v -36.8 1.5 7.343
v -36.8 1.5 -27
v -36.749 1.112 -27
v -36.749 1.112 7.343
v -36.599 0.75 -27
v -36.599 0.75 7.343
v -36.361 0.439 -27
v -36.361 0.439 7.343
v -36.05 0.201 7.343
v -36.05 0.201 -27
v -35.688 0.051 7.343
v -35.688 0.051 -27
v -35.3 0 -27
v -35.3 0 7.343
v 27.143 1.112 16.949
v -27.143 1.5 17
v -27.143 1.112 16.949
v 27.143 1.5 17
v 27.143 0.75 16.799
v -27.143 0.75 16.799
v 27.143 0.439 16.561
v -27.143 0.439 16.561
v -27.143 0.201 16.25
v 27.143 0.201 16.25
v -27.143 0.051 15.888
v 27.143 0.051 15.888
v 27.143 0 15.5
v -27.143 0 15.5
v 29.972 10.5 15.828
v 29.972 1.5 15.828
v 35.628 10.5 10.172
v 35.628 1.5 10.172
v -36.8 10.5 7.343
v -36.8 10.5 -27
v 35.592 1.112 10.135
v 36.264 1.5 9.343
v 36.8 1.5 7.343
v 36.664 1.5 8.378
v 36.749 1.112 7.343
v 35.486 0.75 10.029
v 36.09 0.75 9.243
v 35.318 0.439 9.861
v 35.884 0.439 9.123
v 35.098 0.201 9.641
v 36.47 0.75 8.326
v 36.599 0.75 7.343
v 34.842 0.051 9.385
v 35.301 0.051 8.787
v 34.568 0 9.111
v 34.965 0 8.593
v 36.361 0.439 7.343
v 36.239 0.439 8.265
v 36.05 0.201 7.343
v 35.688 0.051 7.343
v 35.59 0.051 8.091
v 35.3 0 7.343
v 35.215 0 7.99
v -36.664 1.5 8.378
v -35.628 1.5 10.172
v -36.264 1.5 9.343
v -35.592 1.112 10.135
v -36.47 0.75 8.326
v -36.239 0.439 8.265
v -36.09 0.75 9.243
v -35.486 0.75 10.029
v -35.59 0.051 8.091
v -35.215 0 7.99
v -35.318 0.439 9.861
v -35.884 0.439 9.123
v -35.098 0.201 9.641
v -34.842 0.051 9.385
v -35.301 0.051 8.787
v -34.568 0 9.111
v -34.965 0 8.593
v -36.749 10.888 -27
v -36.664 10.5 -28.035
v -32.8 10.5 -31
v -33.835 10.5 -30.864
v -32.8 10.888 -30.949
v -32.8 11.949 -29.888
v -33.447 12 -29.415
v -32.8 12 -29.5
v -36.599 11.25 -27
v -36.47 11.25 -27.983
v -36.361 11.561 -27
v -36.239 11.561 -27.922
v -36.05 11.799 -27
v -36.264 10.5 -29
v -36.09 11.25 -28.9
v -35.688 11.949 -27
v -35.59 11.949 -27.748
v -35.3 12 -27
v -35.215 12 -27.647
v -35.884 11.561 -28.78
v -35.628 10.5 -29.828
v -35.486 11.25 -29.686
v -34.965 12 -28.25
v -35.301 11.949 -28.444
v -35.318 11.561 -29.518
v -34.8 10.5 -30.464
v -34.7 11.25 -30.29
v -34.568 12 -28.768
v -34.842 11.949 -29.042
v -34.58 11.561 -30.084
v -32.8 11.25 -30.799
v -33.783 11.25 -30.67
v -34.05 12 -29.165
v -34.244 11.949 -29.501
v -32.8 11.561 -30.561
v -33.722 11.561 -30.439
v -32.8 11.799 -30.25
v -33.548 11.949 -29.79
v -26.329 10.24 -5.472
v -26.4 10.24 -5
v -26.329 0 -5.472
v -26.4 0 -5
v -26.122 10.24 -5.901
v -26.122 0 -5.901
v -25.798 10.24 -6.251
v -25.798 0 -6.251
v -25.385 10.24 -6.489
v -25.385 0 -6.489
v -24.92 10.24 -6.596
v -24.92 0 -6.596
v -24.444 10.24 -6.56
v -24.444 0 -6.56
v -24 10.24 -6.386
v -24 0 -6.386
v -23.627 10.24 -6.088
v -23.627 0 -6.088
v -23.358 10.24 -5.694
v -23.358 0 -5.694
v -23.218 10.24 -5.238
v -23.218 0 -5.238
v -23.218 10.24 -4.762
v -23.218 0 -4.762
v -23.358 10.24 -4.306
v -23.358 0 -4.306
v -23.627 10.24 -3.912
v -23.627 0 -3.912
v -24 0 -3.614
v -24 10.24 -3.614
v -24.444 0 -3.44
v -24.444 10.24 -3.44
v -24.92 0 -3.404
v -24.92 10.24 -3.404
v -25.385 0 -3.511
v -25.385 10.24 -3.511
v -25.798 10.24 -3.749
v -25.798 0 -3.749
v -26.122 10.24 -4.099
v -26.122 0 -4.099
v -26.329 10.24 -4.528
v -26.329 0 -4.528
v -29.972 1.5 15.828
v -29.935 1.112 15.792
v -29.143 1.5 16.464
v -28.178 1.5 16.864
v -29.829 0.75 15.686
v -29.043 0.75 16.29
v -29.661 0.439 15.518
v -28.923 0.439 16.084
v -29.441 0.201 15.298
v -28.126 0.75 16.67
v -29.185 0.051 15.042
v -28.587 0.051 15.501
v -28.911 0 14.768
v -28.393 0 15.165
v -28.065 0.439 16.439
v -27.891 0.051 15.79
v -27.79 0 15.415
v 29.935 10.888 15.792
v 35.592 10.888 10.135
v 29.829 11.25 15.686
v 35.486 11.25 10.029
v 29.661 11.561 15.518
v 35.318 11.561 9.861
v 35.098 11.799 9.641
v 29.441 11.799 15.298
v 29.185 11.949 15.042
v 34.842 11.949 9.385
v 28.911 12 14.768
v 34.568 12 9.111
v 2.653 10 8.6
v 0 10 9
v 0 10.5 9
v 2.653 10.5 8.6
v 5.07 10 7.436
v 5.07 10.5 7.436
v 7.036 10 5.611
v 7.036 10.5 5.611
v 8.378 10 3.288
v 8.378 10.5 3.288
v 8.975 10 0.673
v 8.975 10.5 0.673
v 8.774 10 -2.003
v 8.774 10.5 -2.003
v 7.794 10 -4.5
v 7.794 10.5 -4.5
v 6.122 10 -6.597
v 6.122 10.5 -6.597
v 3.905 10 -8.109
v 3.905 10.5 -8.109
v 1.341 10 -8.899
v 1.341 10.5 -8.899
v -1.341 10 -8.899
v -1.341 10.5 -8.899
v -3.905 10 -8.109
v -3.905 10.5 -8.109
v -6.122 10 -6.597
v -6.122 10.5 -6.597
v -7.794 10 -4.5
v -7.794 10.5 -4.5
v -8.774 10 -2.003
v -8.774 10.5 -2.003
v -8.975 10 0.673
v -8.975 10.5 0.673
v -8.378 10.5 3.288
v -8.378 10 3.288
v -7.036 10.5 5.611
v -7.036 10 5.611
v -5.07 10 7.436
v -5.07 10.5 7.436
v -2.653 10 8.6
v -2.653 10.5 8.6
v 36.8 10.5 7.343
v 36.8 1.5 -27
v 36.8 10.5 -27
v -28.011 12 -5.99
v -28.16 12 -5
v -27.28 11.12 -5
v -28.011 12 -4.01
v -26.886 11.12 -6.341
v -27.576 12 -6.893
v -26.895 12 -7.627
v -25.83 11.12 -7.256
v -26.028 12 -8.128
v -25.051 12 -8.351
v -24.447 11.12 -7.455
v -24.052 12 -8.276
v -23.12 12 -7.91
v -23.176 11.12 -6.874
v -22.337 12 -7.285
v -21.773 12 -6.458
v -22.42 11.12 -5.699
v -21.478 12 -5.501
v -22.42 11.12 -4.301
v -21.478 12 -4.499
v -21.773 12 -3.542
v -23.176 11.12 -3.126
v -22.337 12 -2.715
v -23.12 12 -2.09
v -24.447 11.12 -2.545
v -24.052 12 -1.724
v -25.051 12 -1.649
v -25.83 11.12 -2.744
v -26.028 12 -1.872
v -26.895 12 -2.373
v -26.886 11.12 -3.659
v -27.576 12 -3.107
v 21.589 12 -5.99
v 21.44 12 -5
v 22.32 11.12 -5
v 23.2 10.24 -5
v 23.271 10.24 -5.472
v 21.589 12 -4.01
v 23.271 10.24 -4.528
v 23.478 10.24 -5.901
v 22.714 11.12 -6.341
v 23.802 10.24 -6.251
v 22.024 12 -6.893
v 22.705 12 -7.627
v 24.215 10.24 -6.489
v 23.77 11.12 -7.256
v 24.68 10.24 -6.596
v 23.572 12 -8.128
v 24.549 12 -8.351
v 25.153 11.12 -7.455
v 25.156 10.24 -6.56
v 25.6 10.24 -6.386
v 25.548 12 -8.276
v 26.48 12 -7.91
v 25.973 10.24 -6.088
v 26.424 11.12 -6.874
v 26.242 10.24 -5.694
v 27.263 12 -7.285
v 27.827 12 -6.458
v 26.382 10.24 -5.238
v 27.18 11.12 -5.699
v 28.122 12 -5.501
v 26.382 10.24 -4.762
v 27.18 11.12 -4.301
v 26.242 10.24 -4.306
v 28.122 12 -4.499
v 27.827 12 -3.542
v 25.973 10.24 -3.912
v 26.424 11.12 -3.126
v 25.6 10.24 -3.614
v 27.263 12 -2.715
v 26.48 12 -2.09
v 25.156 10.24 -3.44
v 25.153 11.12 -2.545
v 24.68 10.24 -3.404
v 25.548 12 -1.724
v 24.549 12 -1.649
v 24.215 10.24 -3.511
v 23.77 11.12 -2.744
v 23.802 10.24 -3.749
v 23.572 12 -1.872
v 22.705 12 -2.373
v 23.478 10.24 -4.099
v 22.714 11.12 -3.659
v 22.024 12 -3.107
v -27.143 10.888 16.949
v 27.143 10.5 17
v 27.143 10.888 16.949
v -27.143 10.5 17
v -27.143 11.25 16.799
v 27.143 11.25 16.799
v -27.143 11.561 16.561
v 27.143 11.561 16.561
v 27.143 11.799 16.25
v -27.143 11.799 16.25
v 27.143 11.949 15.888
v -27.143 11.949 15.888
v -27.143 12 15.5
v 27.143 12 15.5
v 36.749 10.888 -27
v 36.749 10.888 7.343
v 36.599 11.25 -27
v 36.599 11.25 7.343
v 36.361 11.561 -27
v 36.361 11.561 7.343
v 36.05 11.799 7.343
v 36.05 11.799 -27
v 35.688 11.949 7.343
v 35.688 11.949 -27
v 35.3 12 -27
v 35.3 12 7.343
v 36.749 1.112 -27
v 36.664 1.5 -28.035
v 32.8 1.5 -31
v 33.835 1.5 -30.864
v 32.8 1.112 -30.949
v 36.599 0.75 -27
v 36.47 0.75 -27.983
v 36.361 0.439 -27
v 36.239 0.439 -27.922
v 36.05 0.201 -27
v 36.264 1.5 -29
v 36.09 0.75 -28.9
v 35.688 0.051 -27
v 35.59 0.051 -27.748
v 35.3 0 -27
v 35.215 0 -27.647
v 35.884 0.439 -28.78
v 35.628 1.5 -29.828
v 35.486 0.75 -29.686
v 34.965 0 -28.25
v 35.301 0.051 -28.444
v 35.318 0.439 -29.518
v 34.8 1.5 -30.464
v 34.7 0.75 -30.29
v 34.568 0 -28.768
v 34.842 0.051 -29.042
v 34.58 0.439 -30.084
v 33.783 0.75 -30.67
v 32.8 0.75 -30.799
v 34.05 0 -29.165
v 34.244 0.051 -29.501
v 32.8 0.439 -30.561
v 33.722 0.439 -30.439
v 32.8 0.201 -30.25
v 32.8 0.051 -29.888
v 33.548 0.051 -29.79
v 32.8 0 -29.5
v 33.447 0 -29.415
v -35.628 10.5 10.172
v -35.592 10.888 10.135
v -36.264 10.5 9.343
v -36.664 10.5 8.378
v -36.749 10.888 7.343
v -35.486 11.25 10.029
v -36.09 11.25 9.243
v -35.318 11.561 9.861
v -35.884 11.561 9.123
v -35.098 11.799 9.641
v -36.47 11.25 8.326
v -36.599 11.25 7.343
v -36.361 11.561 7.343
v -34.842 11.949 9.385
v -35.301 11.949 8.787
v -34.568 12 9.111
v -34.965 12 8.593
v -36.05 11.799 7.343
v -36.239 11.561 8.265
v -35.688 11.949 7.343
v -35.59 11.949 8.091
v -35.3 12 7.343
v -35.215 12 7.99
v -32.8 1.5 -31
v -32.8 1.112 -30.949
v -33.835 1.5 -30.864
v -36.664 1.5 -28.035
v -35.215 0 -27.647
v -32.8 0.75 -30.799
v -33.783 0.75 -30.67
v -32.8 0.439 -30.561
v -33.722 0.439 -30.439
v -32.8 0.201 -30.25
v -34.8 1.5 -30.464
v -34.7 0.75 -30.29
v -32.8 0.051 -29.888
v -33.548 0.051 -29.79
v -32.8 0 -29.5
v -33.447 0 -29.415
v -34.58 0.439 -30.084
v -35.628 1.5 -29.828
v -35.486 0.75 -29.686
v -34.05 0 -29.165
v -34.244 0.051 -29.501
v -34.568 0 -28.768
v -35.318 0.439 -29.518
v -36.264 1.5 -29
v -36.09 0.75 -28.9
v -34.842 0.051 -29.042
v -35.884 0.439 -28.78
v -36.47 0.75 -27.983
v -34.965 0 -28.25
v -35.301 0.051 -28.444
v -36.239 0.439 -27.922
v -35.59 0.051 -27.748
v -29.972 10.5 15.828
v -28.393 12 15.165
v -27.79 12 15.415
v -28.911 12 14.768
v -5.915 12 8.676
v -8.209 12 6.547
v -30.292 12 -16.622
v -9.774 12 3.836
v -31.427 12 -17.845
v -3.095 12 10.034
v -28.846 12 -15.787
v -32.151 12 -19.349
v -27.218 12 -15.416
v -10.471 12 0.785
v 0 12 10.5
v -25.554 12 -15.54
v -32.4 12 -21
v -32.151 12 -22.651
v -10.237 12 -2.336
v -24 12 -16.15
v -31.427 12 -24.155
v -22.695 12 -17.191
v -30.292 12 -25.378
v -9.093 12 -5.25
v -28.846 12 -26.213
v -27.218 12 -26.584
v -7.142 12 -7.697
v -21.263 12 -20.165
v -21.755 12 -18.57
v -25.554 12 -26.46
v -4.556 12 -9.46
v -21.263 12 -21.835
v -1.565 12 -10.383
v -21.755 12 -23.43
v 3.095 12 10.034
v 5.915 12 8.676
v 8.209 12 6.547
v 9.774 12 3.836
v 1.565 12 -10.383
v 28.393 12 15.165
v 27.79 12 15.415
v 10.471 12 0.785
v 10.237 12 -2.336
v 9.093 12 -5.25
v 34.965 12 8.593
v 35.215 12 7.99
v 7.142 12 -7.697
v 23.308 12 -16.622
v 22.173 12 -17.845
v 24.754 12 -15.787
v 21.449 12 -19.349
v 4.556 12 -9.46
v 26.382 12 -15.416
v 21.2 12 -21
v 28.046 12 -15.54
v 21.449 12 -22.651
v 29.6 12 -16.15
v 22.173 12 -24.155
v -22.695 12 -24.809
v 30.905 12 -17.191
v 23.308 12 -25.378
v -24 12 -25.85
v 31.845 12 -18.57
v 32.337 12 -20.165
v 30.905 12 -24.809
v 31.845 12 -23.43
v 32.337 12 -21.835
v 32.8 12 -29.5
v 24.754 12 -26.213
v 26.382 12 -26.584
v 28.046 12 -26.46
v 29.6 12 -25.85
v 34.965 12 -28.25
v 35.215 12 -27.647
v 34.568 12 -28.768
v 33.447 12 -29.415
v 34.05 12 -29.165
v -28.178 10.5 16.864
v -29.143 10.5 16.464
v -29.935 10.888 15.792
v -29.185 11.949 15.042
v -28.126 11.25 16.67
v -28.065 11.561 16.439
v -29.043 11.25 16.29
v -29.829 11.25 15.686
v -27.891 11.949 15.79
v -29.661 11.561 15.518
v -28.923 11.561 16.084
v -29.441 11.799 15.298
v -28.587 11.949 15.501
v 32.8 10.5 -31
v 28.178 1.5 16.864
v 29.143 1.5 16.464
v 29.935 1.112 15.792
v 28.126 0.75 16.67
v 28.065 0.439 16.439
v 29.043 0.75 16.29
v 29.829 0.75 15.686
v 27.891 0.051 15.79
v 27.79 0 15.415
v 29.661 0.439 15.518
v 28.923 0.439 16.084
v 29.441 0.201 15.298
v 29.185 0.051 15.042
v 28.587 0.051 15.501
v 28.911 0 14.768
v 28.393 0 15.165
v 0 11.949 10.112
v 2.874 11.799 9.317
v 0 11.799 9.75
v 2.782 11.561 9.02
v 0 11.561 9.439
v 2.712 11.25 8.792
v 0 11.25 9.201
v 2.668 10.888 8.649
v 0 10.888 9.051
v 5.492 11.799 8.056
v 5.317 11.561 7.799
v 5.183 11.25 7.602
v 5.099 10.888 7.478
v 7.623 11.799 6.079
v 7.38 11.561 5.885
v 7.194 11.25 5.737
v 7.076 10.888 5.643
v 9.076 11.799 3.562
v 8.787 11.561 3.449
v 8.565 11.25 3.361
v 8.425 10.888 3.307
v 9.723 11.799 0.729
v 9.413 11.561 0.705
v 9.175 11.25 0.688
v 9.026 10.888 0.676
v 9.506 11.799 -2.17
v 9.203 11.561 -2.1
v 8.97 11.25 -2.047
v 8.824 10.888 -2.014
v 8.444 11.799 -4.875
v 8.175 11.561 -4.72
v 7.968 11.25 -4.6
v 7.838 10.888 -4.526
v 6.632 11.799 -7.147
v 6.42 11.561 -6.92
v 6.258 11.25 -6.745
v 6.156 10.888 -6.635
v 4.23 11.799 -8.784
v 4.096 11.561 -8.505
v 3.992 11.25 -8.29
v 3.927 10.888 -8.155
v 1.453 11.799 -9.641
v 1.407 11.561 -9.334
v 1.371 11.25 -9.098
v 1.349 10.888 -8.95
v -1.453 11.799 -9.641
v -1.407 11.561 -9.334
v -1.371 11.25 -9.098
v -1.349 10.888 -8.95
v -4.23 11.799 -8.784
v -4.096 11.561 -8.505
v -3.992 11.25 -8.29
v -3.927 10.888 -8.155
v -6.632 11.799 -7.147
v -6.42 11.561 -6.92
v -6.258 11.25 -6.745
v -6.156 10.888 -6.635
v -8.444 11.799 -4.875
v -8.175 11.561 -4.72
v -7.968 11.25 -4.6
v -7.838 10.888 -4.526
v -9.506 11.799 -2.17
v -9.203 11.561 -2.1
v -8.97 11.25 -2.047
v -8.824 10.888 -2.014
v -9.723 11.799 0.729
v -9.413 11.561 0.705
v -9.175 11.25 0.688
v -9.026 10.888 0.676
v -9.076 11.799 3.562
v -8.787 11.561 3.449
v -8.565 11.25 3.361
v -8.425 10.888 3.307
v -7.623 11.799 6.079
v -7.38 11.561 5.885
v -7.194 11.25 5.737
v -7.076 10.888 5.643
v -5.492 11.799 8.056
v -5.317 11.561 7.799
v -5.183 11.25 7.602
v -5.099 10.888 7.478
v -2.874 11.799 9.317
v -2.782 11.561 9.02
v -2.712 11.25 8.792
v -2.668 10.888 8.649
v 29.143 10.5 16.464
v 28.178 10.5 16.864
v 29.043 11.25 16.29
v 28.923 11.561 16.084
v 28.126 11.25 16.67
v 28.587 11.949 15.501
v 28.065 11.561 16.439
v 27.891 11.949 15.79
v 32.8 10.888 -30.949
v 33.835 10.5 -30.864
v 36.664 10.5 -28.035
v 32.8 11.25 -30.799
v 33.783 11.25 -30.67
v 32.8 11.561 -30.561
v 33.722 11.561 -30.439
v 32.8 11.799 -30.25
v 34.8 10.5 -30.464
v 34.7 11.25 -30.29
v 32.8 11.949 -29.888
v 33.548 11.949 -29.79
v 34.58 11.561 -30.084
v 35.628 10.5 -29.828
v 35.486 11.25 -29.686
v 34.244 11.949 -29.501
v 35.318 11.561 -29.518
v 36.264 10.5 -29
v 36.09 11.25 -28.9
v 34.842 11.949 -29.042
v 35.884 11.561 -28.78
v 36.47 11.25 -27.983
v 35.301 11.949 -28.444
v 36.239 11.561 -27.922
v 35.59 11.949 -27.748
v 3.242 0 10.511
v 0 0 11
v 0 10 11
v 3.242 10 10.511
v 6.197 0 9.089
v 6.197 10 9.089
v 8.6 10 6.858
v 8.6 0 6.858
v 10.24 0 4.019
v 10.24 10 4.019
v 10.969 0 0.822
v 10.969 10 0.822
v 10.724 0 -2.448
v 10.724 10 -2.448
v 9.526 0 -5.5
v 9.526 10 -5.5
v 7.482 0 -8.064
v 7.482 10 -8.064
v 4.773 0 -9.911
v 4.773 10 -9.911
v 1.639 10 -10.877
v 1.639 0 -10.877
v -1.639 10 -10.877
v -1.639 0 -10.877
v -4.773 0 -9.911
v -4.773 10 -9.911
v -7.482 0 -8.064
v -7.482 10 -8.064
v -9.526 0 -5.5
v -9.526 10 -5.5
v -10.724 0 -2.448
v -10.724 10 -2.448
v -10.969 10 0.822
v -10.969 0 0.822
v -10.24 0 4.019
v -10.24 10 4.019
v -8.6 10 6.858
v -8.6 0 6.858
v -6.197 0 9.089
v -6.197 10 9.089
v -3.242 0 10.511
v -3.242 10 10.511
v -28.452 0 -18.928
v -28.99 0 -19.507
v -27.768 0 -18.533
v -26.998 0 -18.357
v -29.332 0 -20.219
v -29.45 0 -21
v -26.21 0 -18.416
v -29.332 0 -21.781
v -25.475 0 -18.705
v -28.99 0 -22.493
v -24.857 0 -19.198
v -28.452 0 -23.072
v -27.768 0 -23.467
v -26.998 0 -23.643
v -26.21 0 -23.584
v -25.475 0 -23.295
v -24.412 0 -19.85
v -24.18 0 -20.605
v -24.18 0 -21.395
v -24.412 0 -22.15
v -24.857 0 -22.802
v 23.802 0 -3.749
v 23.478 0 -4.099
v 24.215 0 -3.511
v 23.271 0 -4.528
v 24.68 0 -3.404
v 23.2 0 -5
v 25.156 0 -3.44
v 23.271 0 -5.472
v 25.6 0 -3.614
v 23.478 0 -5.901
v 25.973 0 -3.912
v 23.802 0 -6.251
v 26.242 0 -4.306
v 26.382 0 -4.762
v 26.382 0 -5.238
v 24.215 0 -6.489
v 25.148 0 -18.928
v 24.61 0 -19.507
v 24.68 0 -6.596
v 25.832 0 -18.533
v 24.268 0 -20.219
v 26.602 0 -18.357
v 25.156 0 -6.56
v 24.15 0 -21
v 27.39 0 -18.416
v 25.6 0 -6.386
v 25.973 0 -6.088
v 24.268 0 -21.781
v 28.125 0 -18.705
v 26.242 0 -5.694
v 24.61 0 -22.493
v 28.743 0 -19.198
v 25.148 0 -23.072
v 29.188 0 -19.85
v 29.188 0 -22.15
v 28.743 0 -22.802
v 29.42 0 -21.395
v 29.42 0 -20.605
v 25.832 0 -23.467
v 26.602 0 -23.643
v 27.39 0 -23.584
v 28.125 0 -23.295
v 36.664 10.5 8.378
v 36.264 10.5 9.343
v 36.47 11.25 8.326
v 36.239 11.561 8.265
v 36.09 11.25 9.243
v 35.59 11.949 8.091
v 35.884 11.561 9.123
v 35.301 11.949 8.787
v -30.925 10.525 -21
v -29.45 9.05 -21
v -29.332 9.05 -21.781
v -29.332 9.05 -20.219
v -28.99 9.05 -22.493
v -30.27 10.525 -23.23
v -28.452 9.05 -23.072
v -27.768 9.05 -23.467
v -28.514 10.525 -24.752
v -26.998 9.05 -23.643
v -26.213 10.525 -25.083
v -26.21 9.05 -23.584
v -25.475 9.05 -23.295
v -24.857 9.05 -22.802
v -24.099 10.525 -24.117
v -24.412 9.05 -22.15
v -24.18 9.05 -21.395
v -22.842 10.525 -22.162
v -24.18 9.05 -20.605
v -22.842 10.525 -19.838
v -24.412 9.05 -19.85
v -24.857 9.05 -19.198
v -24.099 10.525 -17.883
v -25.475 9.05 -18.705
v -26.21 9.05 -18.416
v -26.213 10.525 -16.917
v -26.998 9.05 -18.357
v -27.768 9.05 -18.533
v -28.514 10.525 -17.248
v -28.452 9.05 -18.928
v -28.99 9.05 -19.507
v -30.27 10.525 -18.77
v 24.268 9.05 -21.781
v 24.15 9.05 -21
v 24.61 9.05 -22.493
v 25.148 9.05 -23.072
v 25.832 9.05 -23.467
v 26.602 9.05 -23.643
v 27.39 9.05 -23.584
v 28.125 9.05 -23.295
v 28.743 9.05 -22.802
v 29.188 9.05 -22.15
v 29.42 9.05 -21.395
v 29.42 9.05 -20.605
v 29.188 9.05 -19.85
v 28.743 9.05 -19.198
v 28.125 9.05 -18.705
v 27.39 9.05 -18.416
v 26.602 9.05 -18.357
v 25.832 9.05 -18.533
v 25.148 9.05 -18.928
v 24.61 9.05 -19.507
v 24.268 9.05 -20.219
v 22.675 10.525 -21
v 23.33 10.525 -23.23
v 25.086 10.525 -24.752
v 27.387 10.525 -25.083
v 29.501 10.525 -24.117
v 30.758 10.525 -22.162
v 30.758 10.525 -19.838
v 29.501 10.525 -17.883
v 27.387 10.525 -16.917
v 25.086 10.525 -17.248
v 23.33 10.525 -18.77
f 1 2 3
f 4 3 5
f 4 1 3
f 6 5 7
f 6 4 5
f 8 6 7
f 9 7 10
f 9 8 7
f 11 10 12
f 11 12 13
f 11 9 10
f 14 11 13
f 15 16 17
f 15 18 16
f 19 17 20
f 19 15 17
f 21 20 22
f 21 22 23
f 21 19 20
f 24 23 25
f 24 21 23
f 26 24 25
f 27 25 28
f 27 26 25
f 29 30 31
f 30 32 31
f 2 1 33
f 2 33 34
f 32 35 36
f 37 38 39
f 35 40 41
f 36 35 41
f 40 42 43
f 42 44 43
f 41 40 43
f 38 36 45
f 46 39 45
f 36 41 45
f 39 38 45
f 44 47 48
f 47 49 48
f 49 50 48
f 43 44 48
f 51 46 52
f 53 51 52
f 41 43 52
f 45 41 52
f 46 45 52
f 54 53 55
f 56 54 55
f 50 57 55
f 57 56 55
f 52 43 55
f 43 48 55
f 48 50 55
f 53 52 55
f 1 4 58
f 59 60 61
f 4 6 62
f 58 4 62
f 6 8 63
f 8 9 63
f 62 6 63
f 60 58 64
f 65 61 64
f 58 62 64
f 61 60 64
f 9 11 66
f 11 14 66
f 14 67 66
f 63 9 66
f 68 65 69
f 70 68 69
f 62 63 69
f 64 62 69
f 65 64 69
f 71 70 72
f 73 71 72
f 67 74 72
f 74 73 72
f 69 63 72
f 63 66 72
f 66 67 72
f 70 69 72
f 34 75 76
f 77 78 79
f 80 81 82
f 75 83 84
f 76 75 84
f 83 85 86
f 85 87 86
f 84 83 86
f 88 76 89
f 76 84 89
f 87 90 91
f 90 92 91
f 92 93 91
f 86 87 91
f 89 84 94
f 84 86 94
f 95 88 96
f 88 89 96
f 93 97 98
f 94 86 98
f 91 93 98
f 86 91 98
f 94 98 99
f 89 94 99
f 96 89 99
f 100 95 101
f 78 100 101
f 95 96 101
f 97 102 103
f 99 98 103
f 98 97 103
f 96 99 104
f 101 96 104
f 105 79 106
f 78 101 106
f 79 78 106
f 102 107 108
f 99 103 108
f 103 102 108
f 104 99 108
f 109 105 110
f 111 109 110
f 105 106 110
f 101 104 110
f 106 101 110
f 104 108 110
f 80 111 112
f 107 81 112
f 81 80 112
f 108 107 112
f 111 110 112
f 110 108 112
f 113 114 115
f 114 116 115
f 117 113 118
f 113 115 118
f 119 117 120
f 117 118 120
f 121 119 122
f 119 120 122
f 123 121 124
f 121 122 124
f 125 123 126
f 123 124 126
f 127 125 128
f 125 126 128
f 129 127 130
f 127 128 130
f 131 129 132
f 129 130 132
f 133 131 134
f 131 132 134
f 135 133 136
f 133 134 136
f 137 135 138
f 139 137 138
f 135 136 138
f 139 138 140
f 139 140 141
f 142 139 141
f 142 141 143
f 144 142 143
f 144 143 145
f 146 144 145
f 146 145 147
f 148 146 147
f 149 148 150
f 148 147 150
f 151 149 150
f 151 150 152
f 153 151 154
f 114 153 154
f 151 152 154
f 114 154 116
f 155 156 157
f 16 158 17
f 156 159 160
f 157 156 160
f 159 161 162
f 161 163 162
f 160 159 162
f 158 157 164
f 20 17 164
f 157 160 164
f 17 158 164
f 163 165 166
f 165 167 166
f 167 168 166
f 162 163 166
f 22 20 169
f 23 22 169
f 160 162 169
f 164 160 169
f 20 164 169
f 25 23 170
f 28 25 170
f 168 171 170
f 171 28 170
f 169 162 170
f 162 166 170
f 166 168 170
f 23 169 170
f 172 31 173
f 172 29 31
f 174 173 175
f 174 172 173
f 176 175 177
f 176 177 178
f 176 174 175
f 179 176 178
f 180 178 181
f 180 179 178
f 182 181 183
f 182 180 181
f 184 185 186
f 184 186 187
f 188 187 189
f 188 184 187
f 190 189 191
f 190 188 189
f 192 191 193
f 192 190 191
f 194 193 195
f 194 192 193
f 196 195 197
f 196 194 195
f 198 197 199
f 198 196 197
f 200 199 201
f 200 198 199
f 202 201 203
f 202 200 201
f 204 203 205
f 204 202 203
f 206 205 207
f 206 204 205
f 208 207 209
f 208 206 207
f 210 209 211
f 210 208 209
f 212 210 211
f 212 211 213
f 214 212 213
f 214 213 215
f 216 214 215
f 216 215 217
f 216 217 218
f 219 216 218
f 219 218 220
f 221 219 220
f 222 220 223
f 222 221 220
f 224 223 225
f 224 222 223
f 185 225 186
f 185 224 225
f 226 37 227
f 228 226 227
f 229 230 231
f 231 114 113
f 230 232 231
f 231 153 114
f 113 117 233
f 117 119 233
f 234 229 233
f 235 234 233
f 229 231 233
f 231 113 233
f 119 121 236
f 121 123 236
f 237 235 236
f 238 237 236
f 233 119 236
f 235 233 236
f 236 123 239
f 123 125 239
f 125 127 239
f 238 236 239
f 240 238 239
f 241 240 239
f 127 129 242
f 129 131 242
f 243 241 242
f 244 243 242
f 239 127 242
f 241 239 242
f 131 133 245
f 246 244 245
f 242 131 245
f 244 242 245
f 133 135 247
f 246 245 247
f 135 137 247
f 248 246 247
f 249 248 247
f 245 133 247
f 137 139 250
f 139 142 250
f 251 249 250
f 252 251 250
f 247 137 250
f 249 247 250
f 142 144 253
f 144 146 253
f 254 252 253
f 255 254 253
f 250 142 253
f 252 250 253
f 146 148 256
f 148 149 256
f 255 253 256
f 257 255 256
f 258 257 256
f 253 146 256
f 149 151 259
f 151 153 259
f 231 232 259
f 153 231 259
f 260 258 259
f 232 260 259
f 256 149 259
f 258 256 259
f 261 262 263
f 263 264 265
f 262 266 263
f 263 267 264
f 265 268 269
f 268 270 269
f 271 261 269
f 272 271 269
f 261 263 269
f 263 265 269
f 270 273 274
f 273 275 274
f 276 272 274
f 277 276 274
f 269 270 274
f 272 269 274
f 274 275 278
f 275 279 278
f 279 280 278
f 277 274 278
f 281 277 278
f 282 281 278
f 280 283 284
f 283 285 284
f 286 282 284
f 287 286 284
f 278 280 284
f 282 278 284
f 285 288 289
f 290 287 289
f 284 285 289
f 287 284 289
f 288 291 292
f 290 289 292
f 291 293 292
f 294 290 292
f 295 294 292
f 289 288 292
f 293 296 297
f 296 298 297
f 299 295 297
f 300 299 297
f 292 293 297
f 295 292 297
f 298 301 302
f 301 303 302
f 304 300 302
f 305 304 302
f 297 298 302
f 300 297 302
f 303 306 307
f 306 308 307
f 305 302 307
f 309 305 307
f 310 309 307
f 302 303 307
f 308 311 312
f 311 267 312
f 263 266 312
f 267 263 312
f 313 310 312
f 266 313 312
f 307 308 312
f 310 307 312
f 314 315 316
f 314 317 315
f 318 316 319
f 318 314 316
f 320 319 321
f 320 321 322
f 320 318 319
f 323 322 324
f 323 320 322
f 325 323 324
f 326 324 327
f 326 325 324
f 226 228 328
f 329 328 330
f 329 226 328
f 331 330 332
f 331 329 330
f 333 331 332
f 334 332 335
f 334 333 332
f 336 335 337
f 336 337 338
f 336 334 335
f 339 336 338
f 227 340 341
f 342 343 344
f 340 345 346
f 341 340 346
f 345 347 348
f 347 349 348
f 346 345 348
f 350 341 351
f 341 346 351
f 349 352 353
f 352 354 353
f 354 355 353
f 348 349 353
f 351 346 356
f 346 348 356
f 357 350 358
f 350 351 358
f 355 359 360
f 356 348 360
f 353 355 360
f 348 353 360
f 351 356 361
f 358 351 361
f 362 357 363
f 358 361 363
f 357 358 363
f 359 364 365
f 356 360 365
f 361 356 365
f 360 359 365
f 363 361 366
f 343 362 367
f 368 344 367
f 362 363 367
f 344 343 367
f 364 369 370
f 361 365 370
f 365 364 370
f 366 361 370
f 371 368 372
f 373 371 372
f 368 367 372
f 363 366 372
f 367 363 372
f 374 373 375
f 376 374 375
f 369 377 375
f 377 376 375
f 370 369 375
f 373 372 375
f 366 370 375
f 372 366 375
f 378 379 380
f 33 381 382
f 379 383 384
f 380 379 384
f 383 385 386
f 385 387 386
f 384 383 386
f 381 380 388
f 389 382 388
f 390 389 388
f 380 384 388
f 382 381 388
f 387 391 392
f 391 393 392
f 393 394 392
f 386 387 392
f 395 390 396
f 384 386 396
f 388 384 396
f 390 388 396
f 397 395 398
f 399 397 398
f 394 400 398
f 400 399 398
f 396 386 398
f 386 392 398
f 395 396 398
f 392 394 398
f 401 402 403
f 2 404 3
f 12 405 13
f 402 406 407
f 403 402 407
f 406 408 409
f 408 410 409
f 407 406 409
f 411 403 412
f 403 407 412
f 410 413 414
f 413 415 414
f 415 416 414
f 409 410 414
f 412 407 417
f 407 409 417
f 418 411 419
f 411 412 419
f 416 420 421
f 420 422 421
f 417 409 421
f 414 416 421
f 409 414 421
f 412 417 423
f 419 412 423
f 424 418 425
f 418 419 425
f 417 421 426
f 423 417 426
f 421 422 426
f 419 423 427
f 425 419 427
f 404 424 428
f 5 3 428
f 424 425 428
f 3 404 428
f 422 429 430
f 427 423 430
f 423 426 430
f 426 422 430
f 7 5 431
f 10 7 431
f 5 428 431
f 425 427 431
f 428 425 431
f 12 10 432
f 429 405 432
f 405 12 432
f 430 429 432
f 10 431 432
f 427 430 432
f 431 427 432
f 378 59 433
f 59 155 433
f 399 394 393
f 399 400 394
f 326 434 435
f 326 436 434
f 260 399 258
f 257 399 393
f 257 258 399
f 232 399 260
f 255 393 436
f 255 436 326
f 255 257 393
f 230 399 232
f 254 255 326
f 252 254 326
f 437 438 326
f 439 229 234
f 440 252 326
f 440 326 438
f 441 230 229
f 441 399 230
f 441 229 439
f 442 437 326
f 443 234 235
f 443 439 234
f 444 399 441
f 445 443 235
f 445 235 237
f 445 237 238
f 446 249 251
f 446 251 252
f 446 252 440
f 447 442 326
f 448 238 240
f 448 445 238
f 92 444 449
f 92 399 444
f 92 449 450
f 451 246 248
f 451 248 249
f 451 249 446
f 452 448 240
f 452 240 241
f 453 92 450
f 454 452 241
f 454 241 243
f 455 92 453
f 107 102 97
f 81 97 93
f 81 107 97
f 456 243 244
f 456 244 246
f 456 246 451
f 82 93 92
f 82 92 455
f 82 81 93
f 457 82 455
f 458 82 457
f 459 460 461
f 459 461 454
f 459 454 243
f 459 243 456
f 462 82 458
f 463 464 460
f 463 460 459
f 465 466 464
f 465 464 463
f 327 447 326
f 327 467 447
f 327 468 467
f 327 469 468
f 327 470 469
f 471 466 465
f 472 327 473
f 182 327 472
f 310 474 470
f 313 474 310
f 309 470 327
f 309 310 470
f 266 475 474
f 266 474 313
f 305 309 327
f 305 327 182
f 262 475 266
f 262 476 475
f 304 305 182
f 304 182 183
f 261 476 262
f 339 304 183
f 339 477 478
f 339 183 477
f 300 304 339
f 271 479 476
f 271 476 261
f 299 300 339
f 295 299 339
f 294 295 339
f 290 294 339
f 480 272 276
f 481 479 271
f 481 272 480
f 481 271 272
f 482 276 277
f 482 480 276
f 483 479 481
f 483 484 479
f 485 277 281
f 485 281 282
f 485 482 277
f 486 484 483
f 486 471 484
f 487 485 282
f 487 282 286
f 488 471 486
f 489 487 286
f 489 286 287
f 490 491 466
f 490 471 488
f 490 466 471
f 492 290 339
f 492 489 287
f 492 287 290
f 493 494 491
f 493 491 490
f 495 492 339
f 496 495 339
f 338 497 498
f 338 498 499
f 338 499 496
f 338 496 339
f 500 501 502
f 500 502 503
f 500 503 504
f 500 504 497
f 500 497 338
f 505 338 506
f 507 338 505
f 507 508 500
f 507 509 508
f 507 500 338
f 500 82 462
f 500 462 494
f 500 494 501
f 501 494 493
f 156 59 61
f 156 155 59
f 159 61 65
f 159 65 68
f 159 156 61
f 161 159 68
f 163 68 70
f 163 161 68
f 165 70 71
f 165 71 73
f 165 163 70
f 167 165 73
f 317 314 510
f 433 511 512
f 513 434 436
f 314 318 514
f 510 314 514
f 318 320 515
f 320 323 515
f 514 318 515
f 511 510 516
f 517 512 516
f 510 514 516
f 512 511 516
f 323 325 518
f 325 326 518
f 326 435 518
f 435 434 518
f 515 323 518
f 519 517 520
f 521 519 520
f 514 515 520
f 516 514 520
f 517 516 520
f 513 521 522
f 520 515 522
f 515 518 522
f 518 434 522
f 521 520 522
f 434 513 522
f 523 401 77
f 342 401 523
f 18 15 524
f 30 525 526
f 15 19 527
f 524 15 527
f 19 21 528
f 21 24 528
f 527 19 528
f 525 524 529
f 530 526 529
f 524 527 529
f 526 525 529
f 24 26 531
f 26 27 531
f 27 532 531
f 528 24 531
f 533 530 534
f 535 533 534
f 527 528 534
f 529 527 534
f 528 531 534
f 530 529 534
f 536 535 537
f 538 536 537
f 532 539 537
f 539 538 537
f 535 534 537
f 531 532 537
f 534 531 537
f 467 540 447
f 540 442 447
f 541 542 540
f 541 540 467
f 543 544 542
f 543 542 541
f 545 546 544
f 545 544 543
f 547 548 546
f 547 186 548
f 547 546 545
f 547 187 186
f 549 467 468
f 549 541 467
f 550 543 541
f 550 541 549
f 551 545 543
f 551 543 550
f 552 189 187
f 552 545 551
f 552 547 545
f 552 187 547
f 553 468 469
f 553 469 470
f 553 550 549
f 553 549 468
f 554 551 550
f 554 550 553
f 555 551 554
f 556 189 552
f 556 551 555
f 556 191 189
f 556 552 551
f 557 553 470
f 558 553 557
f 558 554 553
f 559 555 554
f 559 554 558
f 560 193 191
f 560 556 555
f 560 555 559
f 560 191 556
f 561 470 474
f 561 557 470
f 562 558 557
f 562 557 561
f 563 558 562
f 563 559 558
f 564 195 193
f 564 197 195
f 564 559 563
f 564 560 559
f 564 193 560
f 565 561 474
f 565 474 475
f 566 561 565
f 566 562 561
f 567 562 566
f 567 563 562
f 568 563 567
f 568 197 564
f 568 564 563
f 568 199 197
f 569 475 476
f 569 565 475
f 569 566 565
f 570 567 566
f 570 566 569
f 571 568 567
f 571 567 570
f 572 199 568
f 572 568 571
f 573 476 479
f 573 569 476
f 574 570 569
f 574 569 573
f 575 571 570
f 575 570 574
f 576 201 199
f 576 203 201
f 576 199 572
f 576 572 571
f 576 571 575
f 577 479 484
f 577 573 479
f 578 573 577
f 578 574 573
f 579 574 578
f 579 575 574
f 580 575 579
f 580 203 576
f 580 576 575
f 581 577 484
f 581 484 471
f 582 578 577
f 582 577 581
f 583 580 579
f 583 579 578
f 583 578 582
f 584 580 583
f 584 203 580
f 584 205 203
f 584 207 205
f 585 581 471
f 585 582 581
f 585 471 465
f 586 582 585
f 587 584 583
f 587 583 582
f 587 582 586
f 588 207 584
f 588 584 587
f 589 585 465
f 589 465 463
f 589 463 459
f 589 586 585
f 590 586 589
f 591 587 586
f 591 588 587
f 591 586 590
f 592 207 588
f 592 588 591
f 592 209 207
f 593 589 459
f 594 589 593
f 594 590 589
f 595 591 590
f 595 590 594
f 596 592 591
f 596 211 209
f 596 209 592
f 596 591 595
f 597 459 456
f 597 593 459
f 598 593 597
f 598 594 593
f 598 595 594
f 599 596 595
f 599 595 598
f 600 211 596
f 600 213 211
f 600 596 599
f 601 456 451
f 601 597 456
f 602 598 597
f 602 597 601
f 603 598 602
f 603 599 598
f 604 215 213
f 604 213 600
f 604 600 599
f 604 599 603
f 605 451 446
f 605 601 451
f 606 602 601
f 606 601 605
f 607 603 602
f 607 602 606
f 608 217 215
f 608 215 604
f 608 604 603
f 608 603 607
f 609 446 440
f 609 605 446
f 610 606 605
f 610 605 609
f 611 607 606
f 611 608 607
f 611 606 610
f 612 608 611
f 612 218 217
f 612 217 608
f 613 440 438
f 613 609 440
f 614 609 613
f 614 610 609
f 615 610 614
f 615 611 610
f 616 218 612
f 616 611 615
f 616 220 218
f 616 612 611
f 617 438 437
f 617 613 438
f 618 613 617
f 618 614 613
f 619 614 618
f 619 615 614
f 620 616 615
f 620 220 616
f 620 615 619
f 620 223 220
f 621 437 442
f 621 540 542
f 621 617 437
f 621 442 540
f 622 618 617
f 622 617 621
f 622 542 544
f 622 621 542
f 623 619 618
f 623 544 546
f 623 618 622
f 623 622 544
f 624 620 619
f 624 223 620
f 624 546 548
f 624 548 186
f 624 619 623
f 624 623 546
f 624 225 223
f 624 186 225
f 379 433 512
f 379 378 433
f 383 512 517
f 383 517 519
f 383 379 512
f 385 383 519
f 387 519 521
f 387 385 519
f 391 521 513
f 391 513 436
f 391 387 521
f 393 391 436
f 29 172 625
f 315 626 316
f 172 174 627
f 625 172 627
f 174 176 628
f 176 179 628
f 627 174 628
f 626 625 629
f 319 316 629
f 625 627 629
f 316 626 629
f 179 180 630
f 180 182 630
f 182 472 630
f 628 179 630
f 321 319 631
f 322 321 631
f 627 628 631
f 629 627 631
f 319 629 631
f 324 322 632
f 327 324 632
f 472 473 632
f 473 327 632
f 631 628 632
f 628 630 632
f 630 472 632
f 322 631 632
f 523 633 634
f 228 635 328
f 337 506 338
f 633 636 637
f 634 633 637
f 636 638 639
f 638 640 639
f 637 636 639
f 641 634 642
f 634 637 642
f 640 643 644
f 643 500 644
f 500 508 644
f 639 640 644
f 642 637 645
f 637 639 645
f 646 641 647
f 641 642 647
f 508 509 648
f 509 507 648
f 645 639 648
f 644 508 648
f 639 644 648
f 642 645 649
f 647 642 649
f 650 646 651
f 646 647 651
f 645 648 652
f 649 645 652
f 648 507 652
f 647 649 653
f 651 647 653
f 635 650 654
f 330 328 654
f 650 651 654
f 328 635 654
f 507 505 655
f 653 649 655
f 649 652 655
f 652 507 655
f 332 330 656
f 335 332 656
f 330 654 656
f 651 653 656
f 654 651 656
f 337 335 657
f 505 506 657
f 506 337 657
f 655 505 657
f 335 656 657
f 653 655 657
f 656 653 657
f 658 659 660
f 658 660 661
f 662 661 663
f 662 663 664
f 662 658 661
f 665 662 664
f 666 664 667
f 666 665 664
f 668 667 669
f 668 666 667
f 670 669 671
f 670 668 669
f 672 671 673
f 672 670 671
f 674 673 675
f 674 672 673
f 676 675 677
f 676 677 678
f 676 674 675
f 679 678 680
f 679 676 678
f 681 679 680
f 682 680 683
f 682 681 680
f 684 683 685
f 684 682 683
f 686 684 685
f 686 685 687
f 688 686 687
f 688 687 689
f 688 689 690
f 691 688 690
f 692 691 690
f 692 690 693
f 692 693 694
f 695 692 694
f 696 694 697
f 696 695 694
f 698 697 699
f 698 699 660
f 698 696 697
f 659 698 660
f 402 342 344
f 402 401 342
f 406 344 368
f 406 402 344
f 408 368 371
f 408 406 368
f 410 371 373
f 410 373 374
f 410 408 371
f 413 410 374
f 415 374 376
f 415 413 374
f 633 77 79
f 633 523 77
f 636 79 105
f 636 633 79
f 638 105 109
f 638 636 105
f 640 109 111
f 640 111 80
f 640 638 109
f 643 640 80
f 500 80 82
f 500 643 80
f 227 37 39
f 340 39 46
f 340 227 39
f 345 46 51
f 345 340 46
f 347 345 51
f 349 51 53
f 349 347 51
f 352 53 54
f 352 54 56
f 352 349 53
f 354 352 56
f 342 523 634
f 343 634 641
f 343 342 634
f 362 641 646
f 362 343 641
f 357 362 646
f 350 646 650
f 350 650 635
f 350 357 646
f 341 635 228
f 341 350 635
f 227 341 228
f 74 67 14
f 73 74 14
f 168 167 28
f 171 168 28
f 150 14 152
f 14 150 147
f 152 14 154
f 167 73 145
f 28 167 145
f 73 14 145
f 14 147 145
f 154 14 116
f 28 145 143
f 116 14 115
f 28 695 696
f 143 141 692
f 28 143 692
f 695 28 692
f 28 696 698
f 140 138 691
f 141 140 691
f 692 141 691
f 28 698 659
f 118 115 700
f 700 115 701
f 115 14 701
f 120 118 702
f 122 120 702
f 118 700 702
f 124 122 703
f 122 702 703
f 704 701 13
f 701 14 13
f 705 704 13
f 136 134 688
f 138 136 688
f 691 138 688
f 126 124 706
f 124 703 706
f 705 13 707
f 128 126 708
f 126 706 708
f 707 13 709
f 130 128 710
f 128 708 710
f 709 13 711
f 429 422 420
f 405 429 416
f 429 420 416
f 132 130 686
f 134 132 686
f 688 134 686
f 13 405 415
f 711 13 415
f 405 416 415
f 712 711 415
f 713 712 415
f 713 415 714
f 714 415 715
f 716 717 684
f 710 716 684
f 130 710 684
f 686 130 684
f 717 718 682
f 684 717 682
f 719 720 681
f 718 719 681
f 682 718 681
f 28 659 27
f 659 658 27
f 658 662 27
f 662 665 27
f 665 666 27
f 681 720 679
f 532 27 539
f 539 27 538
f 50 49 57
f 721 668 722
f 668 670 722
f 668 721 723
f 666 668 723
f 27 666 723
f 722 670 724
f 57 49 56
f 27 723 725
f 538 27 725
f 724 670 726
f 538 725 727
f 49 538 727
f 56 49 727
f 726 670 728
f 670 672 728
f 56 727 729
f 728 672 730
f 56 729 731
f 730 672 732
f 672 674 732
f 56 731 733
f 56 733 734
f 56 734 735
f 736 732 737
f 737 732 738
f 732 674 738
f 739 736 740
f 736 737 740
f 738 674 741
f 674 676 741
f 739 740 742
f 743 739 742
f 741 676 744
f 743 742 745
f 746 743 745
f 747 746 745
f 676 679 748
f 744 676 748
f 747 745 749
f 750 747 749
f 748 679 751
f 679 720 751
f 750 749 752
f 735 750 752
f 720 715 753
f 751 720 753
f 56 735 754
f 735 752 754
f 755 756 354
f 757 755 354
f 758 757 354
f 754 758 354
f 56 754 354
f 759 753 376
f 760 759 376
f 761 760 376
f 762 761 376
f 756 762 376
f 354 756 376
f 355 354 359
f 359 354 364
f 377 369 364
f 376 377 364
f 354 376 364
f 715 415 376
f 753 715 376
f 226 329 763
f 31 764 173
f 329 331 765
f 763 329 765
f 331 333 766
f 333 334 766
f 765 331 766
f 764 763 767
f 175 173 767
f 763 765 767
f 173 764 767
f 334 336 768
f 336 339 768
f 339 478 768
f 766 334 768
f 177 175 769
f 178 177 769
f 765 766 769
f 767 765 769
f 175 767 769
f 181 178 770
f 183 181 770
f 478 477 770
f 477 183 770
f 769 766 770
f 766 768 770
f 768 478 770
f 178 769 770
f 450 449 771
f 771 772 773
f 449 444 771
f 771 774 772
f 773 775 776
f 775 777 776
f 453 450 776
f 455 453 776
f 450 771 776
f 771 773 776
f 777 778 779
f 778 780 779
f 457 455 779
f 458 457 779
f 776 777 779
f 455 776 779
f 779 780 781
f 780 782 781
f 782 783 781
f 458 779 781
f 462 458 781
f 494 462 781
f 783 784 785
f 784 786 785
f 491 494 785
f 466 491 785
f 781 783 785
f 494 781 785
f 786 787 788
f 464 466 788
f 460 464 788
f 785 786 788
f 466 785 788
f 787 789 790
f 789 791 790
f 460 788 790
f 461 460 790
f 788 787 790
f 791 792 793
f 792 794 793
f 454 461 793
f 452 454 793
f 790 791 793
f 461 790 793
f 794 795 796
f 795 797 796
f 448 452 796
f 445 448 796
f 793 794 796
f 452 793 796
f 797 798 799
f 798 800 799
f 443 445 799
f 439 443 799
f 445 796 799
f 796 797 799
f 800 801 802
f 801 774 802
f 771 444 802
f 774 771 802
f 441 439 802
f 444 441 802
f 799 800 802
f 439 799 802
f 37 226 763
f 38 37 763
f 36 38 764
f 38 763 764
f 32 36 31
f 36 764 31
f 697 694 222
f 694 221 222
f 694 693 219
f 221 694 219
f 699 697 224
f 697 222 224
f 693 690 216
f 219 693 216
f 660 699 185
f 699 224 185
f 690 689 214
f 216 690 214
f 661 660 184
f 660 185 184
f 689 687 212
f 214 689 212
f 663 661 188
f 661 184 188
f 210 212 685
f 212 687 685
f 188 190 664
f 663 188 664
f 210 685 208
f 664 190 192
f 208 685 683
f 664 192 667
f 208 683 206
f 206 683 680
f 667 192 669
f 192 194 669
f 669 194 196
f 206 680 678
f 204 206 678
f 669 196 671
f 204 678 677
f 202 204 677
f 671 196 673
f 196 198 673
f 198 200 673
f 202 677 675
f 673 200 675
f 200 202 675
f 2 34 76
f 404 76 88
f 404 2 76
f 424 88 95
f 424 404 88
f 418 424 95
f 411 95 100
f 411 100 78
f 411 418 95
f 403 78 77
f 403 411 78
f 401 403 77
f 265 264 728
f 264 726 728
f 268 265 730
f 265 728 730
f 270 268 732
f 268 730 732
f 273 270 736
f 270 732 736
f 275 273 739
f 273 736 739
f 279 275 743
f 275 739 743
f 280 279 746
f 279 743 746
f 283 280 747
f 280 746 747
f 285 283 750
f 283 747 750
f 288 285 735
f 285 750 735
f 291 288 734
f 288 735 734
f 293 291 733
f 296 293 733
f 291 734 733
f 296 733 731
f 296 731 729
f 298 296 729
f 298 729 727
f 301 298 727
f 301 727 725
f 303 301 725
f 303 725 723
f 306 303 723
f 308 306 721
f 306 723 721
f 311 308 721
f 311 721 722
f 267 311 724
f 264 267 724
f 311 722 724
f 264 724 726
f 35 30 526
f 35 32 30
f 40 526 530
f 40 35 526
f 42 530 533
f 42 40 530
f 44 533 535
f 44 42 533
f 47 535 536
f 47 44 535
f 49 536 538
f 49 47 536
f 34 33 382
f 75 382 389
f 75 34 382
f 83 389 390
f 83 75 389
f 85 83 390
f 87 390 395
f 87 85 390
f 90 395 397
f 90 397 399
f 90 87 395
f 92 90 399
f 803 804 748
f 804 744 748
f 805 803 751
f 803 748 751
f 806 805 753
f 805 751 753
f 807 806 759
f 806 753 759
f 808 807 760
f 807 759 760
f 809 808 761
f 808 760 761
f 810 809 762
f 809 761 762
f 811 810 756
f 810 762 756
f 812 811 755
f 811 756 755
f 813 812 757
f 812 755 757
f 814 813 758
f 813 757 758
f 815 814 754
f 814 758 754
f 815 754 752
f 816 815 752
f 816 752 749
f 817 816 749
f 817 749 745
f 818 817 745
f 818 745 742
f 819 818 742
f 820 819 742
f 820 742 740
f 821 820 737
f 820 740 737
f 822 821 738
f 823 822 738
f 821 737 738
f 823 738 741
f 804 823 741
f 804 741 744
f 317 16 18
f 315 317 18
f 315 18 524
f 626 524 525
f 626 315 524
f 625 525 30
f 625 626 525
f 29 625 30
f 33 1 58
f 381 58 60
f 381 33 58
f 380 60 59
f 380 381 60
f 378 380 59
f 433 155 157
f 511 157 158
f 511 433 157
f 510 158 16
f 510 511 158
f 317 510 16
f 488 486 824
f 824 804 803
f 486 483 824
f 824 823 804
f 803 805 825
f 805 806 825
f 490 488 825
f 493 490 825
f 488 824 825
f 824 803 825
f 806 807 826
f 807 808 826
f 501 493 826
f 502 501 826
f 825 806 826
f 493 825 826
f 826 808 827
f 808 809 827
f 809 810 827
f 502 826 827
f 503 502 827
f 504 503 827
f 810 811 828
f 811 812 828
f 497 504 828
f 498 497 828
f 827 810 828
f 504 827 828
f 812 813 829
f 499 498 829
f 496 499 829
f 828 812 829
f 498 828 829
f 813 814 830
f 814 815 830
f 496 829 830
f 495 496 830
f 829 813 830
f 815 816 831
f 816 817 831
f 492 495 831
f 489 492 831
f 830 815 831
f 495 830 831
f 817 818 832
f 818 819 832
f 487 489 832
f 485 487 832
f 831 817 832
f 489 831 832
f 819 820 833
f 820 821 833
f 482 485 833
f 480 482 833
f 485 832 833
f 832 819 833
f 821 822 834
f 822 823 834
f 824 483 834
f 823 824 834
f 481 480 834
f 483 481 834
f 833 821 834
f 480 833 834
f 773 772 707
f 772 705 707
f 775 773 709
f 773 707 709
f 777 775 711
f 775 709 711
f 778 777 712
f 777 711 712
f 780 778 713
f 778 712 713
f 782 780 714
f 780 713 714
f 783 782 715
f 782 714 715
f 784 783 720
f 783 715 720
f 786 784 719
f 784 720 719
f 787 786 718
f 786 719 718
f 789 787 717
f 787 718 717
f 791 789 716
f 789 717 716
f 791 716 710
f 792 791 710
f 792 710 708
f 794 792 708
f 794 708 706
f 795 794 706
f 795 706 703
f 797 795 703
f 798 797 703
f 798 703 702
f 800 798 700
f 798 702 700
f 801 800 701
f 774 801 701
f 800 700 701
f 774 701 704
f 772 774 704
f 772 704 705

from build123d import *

# Parameters (mm, degrees)
SKETCH3_R                     = 11
BOSS_EXTRUDE1_DEPTH           = 10
SKETCH4_W                     = 73.6
SKETCH4_H                     = 48
SKETCH4_R                     = 9
BOSS_EXTRUDE2_DEPTH           = 2
CSK_FOR_M5_SFHCS1_D           = 5.3
CSK_FOR_M5_SFHCS1_CSINK_D     = 11.2
CSK_FOR_M5_SFHCS1_CSINK_ANGLE = 90
CHAMFER1_SIZE                 = 8
FILLET1_R                     = 4
FILLET2_R                     = 1.5
CSK_FOR_M3_SFHCS1_D           = 3.2
CSK_FOR_M3_SFHCS1_CSINK_D     = 6.72
CSK_FOR_M3_SFHCS1_CSINK_ANGLE = 90


with BuildPart() as part:
    # Sketch3 → Boss-Extrude1 (new body)
    with BuildSketch(Plane(origin=(0, 0, 0), x_dir=(1, 0, 0), z_dir=(0, 1, 0))):
        Polygon((-17, -17), (17, -17), (36.8, -17), (36.8, 11), (36.8, 31), (-36.8, 31), (-36.8, 11), (-36.8, -17), align=None)
        with Locations(Location((0, 0, 0), (0, 0, 270))):
            Circle(SKETCH3_R, mode=Mode.SUBTRACT)
    extrude(amount=BOSS_EXTRUDE1_DEPTH)

    # Sketch4 → Boss-Extrude2 (add)
    with BuildSketch(Plane(origin=(0, 10, 0), x_dir=(1, 0, 0), z_dir=(0, 1, 0))):
        with Locations((0, 7)):
            Rectangle(SKETCH4_W, SKETCH4_H)
        with Locations(Location((0, 0, 0), (0, 0, 270))):
            Circle(SKETCH4_R, mode=Mode.SUBTRACT)
    extrude(amount=BOSS_EXTRUDE2_DEPTH)

    # CSK for M5 SFHCS1 (through all)
    with Locations(Plane(origin=(0, 12, 0), x_dir=(1, 0, 0), z_dir=(0, 1, 0))):
        with Locations((26.8, 21), (-26.8, 21)):
            CounterSinkHole(CSK_FOR_M5_SFHCS1_D / 2, CSK_FOR_M5_SFHCS1_CSINK_D / 2, counter_sink_angle=CSK_FOR_M5_SFHCS1_CSINK_ANGLE)

    # Chamfer1
    chamfer1_edges = [part.edges().sort_by_distance(p)[0] for p in [
        (-36.8, 6, 17),
        (36.8, 6, 17),
    ]]
    chamfer(chamfer1_edges, length=CHAMFER1_SIZE)

    # Fillet1
    fillet1_edges = [part.edges().sort_by_distance(p)[0] for p in [
        (-36.8, 6, -31),
        (36.8, 6, -31),
        (28.8, 6, 17),
        (-28.8, 6, 17),
        (-36.8, 6, 9),
        (36.8, 6, 9),
    ]]
    fillet(fillet1_edges, radius=FILLET1_R)

    # Fillet2
    fillet2_edges = [part.edges().sort_by_distance(p)[0] for p in [
        (0, 12, -9),
        (-36.8, 0, -9.828427125),
        (-36.8, 12, -9.828427125),
        (0, 0, 17),
        (-32.8, 0, 13),
        (0, 0, -31),
        (36.8, 0, -9.828427125),
        (32.8, 0, 13),
        (-28.67387948, 0, 16.69551813),
        (-36.49551813, 0, 8.87387948),
        (28.67387948, 0, 16.69551813),
        (36.49551813, 0, 8.87387948),
        (35.628427125, 0, -29.828427125),
        (-35.628427125, 0, -29.828427125),
        (0, 12, -31),
        (-32.8, 12, 13),
        (0, 12, 17),
        (32.8, 12, 13),
        (36.8, 12, -9.828427125),
        (-28.67387948, 12, 16.69551813),
        (-36.49551813, 12, 8.87387948),
        (28.67387948, 12, 16.69551813),
        (36.49551813, 12, 8.87387948),
        (35.628427125, 12, -29.828427125),
        (-35.628427125, 12, -29.828427125),
    ]]
    fillet(fillet2_edges, radius=FILLET2_R)

    # CSK for M3 SFHCS1 (through all)
    with Locations(Plane(origin=(0, 12, 0), x_dir=(1, 0, 0), z_dir=(0, 1, 0))):
        with Locations((24.8, 5), (-24.8, 5)):
            CounterSinkHole(CSK_FOR_M3_SFHCS1_D / 2, CSK_FOR_M3_SFHCS1_CSINK_D / 2, counter_sink_angle=CSK_FOR_M3_SFHCS1_CSINK_ANGLE)


solid = part.part
